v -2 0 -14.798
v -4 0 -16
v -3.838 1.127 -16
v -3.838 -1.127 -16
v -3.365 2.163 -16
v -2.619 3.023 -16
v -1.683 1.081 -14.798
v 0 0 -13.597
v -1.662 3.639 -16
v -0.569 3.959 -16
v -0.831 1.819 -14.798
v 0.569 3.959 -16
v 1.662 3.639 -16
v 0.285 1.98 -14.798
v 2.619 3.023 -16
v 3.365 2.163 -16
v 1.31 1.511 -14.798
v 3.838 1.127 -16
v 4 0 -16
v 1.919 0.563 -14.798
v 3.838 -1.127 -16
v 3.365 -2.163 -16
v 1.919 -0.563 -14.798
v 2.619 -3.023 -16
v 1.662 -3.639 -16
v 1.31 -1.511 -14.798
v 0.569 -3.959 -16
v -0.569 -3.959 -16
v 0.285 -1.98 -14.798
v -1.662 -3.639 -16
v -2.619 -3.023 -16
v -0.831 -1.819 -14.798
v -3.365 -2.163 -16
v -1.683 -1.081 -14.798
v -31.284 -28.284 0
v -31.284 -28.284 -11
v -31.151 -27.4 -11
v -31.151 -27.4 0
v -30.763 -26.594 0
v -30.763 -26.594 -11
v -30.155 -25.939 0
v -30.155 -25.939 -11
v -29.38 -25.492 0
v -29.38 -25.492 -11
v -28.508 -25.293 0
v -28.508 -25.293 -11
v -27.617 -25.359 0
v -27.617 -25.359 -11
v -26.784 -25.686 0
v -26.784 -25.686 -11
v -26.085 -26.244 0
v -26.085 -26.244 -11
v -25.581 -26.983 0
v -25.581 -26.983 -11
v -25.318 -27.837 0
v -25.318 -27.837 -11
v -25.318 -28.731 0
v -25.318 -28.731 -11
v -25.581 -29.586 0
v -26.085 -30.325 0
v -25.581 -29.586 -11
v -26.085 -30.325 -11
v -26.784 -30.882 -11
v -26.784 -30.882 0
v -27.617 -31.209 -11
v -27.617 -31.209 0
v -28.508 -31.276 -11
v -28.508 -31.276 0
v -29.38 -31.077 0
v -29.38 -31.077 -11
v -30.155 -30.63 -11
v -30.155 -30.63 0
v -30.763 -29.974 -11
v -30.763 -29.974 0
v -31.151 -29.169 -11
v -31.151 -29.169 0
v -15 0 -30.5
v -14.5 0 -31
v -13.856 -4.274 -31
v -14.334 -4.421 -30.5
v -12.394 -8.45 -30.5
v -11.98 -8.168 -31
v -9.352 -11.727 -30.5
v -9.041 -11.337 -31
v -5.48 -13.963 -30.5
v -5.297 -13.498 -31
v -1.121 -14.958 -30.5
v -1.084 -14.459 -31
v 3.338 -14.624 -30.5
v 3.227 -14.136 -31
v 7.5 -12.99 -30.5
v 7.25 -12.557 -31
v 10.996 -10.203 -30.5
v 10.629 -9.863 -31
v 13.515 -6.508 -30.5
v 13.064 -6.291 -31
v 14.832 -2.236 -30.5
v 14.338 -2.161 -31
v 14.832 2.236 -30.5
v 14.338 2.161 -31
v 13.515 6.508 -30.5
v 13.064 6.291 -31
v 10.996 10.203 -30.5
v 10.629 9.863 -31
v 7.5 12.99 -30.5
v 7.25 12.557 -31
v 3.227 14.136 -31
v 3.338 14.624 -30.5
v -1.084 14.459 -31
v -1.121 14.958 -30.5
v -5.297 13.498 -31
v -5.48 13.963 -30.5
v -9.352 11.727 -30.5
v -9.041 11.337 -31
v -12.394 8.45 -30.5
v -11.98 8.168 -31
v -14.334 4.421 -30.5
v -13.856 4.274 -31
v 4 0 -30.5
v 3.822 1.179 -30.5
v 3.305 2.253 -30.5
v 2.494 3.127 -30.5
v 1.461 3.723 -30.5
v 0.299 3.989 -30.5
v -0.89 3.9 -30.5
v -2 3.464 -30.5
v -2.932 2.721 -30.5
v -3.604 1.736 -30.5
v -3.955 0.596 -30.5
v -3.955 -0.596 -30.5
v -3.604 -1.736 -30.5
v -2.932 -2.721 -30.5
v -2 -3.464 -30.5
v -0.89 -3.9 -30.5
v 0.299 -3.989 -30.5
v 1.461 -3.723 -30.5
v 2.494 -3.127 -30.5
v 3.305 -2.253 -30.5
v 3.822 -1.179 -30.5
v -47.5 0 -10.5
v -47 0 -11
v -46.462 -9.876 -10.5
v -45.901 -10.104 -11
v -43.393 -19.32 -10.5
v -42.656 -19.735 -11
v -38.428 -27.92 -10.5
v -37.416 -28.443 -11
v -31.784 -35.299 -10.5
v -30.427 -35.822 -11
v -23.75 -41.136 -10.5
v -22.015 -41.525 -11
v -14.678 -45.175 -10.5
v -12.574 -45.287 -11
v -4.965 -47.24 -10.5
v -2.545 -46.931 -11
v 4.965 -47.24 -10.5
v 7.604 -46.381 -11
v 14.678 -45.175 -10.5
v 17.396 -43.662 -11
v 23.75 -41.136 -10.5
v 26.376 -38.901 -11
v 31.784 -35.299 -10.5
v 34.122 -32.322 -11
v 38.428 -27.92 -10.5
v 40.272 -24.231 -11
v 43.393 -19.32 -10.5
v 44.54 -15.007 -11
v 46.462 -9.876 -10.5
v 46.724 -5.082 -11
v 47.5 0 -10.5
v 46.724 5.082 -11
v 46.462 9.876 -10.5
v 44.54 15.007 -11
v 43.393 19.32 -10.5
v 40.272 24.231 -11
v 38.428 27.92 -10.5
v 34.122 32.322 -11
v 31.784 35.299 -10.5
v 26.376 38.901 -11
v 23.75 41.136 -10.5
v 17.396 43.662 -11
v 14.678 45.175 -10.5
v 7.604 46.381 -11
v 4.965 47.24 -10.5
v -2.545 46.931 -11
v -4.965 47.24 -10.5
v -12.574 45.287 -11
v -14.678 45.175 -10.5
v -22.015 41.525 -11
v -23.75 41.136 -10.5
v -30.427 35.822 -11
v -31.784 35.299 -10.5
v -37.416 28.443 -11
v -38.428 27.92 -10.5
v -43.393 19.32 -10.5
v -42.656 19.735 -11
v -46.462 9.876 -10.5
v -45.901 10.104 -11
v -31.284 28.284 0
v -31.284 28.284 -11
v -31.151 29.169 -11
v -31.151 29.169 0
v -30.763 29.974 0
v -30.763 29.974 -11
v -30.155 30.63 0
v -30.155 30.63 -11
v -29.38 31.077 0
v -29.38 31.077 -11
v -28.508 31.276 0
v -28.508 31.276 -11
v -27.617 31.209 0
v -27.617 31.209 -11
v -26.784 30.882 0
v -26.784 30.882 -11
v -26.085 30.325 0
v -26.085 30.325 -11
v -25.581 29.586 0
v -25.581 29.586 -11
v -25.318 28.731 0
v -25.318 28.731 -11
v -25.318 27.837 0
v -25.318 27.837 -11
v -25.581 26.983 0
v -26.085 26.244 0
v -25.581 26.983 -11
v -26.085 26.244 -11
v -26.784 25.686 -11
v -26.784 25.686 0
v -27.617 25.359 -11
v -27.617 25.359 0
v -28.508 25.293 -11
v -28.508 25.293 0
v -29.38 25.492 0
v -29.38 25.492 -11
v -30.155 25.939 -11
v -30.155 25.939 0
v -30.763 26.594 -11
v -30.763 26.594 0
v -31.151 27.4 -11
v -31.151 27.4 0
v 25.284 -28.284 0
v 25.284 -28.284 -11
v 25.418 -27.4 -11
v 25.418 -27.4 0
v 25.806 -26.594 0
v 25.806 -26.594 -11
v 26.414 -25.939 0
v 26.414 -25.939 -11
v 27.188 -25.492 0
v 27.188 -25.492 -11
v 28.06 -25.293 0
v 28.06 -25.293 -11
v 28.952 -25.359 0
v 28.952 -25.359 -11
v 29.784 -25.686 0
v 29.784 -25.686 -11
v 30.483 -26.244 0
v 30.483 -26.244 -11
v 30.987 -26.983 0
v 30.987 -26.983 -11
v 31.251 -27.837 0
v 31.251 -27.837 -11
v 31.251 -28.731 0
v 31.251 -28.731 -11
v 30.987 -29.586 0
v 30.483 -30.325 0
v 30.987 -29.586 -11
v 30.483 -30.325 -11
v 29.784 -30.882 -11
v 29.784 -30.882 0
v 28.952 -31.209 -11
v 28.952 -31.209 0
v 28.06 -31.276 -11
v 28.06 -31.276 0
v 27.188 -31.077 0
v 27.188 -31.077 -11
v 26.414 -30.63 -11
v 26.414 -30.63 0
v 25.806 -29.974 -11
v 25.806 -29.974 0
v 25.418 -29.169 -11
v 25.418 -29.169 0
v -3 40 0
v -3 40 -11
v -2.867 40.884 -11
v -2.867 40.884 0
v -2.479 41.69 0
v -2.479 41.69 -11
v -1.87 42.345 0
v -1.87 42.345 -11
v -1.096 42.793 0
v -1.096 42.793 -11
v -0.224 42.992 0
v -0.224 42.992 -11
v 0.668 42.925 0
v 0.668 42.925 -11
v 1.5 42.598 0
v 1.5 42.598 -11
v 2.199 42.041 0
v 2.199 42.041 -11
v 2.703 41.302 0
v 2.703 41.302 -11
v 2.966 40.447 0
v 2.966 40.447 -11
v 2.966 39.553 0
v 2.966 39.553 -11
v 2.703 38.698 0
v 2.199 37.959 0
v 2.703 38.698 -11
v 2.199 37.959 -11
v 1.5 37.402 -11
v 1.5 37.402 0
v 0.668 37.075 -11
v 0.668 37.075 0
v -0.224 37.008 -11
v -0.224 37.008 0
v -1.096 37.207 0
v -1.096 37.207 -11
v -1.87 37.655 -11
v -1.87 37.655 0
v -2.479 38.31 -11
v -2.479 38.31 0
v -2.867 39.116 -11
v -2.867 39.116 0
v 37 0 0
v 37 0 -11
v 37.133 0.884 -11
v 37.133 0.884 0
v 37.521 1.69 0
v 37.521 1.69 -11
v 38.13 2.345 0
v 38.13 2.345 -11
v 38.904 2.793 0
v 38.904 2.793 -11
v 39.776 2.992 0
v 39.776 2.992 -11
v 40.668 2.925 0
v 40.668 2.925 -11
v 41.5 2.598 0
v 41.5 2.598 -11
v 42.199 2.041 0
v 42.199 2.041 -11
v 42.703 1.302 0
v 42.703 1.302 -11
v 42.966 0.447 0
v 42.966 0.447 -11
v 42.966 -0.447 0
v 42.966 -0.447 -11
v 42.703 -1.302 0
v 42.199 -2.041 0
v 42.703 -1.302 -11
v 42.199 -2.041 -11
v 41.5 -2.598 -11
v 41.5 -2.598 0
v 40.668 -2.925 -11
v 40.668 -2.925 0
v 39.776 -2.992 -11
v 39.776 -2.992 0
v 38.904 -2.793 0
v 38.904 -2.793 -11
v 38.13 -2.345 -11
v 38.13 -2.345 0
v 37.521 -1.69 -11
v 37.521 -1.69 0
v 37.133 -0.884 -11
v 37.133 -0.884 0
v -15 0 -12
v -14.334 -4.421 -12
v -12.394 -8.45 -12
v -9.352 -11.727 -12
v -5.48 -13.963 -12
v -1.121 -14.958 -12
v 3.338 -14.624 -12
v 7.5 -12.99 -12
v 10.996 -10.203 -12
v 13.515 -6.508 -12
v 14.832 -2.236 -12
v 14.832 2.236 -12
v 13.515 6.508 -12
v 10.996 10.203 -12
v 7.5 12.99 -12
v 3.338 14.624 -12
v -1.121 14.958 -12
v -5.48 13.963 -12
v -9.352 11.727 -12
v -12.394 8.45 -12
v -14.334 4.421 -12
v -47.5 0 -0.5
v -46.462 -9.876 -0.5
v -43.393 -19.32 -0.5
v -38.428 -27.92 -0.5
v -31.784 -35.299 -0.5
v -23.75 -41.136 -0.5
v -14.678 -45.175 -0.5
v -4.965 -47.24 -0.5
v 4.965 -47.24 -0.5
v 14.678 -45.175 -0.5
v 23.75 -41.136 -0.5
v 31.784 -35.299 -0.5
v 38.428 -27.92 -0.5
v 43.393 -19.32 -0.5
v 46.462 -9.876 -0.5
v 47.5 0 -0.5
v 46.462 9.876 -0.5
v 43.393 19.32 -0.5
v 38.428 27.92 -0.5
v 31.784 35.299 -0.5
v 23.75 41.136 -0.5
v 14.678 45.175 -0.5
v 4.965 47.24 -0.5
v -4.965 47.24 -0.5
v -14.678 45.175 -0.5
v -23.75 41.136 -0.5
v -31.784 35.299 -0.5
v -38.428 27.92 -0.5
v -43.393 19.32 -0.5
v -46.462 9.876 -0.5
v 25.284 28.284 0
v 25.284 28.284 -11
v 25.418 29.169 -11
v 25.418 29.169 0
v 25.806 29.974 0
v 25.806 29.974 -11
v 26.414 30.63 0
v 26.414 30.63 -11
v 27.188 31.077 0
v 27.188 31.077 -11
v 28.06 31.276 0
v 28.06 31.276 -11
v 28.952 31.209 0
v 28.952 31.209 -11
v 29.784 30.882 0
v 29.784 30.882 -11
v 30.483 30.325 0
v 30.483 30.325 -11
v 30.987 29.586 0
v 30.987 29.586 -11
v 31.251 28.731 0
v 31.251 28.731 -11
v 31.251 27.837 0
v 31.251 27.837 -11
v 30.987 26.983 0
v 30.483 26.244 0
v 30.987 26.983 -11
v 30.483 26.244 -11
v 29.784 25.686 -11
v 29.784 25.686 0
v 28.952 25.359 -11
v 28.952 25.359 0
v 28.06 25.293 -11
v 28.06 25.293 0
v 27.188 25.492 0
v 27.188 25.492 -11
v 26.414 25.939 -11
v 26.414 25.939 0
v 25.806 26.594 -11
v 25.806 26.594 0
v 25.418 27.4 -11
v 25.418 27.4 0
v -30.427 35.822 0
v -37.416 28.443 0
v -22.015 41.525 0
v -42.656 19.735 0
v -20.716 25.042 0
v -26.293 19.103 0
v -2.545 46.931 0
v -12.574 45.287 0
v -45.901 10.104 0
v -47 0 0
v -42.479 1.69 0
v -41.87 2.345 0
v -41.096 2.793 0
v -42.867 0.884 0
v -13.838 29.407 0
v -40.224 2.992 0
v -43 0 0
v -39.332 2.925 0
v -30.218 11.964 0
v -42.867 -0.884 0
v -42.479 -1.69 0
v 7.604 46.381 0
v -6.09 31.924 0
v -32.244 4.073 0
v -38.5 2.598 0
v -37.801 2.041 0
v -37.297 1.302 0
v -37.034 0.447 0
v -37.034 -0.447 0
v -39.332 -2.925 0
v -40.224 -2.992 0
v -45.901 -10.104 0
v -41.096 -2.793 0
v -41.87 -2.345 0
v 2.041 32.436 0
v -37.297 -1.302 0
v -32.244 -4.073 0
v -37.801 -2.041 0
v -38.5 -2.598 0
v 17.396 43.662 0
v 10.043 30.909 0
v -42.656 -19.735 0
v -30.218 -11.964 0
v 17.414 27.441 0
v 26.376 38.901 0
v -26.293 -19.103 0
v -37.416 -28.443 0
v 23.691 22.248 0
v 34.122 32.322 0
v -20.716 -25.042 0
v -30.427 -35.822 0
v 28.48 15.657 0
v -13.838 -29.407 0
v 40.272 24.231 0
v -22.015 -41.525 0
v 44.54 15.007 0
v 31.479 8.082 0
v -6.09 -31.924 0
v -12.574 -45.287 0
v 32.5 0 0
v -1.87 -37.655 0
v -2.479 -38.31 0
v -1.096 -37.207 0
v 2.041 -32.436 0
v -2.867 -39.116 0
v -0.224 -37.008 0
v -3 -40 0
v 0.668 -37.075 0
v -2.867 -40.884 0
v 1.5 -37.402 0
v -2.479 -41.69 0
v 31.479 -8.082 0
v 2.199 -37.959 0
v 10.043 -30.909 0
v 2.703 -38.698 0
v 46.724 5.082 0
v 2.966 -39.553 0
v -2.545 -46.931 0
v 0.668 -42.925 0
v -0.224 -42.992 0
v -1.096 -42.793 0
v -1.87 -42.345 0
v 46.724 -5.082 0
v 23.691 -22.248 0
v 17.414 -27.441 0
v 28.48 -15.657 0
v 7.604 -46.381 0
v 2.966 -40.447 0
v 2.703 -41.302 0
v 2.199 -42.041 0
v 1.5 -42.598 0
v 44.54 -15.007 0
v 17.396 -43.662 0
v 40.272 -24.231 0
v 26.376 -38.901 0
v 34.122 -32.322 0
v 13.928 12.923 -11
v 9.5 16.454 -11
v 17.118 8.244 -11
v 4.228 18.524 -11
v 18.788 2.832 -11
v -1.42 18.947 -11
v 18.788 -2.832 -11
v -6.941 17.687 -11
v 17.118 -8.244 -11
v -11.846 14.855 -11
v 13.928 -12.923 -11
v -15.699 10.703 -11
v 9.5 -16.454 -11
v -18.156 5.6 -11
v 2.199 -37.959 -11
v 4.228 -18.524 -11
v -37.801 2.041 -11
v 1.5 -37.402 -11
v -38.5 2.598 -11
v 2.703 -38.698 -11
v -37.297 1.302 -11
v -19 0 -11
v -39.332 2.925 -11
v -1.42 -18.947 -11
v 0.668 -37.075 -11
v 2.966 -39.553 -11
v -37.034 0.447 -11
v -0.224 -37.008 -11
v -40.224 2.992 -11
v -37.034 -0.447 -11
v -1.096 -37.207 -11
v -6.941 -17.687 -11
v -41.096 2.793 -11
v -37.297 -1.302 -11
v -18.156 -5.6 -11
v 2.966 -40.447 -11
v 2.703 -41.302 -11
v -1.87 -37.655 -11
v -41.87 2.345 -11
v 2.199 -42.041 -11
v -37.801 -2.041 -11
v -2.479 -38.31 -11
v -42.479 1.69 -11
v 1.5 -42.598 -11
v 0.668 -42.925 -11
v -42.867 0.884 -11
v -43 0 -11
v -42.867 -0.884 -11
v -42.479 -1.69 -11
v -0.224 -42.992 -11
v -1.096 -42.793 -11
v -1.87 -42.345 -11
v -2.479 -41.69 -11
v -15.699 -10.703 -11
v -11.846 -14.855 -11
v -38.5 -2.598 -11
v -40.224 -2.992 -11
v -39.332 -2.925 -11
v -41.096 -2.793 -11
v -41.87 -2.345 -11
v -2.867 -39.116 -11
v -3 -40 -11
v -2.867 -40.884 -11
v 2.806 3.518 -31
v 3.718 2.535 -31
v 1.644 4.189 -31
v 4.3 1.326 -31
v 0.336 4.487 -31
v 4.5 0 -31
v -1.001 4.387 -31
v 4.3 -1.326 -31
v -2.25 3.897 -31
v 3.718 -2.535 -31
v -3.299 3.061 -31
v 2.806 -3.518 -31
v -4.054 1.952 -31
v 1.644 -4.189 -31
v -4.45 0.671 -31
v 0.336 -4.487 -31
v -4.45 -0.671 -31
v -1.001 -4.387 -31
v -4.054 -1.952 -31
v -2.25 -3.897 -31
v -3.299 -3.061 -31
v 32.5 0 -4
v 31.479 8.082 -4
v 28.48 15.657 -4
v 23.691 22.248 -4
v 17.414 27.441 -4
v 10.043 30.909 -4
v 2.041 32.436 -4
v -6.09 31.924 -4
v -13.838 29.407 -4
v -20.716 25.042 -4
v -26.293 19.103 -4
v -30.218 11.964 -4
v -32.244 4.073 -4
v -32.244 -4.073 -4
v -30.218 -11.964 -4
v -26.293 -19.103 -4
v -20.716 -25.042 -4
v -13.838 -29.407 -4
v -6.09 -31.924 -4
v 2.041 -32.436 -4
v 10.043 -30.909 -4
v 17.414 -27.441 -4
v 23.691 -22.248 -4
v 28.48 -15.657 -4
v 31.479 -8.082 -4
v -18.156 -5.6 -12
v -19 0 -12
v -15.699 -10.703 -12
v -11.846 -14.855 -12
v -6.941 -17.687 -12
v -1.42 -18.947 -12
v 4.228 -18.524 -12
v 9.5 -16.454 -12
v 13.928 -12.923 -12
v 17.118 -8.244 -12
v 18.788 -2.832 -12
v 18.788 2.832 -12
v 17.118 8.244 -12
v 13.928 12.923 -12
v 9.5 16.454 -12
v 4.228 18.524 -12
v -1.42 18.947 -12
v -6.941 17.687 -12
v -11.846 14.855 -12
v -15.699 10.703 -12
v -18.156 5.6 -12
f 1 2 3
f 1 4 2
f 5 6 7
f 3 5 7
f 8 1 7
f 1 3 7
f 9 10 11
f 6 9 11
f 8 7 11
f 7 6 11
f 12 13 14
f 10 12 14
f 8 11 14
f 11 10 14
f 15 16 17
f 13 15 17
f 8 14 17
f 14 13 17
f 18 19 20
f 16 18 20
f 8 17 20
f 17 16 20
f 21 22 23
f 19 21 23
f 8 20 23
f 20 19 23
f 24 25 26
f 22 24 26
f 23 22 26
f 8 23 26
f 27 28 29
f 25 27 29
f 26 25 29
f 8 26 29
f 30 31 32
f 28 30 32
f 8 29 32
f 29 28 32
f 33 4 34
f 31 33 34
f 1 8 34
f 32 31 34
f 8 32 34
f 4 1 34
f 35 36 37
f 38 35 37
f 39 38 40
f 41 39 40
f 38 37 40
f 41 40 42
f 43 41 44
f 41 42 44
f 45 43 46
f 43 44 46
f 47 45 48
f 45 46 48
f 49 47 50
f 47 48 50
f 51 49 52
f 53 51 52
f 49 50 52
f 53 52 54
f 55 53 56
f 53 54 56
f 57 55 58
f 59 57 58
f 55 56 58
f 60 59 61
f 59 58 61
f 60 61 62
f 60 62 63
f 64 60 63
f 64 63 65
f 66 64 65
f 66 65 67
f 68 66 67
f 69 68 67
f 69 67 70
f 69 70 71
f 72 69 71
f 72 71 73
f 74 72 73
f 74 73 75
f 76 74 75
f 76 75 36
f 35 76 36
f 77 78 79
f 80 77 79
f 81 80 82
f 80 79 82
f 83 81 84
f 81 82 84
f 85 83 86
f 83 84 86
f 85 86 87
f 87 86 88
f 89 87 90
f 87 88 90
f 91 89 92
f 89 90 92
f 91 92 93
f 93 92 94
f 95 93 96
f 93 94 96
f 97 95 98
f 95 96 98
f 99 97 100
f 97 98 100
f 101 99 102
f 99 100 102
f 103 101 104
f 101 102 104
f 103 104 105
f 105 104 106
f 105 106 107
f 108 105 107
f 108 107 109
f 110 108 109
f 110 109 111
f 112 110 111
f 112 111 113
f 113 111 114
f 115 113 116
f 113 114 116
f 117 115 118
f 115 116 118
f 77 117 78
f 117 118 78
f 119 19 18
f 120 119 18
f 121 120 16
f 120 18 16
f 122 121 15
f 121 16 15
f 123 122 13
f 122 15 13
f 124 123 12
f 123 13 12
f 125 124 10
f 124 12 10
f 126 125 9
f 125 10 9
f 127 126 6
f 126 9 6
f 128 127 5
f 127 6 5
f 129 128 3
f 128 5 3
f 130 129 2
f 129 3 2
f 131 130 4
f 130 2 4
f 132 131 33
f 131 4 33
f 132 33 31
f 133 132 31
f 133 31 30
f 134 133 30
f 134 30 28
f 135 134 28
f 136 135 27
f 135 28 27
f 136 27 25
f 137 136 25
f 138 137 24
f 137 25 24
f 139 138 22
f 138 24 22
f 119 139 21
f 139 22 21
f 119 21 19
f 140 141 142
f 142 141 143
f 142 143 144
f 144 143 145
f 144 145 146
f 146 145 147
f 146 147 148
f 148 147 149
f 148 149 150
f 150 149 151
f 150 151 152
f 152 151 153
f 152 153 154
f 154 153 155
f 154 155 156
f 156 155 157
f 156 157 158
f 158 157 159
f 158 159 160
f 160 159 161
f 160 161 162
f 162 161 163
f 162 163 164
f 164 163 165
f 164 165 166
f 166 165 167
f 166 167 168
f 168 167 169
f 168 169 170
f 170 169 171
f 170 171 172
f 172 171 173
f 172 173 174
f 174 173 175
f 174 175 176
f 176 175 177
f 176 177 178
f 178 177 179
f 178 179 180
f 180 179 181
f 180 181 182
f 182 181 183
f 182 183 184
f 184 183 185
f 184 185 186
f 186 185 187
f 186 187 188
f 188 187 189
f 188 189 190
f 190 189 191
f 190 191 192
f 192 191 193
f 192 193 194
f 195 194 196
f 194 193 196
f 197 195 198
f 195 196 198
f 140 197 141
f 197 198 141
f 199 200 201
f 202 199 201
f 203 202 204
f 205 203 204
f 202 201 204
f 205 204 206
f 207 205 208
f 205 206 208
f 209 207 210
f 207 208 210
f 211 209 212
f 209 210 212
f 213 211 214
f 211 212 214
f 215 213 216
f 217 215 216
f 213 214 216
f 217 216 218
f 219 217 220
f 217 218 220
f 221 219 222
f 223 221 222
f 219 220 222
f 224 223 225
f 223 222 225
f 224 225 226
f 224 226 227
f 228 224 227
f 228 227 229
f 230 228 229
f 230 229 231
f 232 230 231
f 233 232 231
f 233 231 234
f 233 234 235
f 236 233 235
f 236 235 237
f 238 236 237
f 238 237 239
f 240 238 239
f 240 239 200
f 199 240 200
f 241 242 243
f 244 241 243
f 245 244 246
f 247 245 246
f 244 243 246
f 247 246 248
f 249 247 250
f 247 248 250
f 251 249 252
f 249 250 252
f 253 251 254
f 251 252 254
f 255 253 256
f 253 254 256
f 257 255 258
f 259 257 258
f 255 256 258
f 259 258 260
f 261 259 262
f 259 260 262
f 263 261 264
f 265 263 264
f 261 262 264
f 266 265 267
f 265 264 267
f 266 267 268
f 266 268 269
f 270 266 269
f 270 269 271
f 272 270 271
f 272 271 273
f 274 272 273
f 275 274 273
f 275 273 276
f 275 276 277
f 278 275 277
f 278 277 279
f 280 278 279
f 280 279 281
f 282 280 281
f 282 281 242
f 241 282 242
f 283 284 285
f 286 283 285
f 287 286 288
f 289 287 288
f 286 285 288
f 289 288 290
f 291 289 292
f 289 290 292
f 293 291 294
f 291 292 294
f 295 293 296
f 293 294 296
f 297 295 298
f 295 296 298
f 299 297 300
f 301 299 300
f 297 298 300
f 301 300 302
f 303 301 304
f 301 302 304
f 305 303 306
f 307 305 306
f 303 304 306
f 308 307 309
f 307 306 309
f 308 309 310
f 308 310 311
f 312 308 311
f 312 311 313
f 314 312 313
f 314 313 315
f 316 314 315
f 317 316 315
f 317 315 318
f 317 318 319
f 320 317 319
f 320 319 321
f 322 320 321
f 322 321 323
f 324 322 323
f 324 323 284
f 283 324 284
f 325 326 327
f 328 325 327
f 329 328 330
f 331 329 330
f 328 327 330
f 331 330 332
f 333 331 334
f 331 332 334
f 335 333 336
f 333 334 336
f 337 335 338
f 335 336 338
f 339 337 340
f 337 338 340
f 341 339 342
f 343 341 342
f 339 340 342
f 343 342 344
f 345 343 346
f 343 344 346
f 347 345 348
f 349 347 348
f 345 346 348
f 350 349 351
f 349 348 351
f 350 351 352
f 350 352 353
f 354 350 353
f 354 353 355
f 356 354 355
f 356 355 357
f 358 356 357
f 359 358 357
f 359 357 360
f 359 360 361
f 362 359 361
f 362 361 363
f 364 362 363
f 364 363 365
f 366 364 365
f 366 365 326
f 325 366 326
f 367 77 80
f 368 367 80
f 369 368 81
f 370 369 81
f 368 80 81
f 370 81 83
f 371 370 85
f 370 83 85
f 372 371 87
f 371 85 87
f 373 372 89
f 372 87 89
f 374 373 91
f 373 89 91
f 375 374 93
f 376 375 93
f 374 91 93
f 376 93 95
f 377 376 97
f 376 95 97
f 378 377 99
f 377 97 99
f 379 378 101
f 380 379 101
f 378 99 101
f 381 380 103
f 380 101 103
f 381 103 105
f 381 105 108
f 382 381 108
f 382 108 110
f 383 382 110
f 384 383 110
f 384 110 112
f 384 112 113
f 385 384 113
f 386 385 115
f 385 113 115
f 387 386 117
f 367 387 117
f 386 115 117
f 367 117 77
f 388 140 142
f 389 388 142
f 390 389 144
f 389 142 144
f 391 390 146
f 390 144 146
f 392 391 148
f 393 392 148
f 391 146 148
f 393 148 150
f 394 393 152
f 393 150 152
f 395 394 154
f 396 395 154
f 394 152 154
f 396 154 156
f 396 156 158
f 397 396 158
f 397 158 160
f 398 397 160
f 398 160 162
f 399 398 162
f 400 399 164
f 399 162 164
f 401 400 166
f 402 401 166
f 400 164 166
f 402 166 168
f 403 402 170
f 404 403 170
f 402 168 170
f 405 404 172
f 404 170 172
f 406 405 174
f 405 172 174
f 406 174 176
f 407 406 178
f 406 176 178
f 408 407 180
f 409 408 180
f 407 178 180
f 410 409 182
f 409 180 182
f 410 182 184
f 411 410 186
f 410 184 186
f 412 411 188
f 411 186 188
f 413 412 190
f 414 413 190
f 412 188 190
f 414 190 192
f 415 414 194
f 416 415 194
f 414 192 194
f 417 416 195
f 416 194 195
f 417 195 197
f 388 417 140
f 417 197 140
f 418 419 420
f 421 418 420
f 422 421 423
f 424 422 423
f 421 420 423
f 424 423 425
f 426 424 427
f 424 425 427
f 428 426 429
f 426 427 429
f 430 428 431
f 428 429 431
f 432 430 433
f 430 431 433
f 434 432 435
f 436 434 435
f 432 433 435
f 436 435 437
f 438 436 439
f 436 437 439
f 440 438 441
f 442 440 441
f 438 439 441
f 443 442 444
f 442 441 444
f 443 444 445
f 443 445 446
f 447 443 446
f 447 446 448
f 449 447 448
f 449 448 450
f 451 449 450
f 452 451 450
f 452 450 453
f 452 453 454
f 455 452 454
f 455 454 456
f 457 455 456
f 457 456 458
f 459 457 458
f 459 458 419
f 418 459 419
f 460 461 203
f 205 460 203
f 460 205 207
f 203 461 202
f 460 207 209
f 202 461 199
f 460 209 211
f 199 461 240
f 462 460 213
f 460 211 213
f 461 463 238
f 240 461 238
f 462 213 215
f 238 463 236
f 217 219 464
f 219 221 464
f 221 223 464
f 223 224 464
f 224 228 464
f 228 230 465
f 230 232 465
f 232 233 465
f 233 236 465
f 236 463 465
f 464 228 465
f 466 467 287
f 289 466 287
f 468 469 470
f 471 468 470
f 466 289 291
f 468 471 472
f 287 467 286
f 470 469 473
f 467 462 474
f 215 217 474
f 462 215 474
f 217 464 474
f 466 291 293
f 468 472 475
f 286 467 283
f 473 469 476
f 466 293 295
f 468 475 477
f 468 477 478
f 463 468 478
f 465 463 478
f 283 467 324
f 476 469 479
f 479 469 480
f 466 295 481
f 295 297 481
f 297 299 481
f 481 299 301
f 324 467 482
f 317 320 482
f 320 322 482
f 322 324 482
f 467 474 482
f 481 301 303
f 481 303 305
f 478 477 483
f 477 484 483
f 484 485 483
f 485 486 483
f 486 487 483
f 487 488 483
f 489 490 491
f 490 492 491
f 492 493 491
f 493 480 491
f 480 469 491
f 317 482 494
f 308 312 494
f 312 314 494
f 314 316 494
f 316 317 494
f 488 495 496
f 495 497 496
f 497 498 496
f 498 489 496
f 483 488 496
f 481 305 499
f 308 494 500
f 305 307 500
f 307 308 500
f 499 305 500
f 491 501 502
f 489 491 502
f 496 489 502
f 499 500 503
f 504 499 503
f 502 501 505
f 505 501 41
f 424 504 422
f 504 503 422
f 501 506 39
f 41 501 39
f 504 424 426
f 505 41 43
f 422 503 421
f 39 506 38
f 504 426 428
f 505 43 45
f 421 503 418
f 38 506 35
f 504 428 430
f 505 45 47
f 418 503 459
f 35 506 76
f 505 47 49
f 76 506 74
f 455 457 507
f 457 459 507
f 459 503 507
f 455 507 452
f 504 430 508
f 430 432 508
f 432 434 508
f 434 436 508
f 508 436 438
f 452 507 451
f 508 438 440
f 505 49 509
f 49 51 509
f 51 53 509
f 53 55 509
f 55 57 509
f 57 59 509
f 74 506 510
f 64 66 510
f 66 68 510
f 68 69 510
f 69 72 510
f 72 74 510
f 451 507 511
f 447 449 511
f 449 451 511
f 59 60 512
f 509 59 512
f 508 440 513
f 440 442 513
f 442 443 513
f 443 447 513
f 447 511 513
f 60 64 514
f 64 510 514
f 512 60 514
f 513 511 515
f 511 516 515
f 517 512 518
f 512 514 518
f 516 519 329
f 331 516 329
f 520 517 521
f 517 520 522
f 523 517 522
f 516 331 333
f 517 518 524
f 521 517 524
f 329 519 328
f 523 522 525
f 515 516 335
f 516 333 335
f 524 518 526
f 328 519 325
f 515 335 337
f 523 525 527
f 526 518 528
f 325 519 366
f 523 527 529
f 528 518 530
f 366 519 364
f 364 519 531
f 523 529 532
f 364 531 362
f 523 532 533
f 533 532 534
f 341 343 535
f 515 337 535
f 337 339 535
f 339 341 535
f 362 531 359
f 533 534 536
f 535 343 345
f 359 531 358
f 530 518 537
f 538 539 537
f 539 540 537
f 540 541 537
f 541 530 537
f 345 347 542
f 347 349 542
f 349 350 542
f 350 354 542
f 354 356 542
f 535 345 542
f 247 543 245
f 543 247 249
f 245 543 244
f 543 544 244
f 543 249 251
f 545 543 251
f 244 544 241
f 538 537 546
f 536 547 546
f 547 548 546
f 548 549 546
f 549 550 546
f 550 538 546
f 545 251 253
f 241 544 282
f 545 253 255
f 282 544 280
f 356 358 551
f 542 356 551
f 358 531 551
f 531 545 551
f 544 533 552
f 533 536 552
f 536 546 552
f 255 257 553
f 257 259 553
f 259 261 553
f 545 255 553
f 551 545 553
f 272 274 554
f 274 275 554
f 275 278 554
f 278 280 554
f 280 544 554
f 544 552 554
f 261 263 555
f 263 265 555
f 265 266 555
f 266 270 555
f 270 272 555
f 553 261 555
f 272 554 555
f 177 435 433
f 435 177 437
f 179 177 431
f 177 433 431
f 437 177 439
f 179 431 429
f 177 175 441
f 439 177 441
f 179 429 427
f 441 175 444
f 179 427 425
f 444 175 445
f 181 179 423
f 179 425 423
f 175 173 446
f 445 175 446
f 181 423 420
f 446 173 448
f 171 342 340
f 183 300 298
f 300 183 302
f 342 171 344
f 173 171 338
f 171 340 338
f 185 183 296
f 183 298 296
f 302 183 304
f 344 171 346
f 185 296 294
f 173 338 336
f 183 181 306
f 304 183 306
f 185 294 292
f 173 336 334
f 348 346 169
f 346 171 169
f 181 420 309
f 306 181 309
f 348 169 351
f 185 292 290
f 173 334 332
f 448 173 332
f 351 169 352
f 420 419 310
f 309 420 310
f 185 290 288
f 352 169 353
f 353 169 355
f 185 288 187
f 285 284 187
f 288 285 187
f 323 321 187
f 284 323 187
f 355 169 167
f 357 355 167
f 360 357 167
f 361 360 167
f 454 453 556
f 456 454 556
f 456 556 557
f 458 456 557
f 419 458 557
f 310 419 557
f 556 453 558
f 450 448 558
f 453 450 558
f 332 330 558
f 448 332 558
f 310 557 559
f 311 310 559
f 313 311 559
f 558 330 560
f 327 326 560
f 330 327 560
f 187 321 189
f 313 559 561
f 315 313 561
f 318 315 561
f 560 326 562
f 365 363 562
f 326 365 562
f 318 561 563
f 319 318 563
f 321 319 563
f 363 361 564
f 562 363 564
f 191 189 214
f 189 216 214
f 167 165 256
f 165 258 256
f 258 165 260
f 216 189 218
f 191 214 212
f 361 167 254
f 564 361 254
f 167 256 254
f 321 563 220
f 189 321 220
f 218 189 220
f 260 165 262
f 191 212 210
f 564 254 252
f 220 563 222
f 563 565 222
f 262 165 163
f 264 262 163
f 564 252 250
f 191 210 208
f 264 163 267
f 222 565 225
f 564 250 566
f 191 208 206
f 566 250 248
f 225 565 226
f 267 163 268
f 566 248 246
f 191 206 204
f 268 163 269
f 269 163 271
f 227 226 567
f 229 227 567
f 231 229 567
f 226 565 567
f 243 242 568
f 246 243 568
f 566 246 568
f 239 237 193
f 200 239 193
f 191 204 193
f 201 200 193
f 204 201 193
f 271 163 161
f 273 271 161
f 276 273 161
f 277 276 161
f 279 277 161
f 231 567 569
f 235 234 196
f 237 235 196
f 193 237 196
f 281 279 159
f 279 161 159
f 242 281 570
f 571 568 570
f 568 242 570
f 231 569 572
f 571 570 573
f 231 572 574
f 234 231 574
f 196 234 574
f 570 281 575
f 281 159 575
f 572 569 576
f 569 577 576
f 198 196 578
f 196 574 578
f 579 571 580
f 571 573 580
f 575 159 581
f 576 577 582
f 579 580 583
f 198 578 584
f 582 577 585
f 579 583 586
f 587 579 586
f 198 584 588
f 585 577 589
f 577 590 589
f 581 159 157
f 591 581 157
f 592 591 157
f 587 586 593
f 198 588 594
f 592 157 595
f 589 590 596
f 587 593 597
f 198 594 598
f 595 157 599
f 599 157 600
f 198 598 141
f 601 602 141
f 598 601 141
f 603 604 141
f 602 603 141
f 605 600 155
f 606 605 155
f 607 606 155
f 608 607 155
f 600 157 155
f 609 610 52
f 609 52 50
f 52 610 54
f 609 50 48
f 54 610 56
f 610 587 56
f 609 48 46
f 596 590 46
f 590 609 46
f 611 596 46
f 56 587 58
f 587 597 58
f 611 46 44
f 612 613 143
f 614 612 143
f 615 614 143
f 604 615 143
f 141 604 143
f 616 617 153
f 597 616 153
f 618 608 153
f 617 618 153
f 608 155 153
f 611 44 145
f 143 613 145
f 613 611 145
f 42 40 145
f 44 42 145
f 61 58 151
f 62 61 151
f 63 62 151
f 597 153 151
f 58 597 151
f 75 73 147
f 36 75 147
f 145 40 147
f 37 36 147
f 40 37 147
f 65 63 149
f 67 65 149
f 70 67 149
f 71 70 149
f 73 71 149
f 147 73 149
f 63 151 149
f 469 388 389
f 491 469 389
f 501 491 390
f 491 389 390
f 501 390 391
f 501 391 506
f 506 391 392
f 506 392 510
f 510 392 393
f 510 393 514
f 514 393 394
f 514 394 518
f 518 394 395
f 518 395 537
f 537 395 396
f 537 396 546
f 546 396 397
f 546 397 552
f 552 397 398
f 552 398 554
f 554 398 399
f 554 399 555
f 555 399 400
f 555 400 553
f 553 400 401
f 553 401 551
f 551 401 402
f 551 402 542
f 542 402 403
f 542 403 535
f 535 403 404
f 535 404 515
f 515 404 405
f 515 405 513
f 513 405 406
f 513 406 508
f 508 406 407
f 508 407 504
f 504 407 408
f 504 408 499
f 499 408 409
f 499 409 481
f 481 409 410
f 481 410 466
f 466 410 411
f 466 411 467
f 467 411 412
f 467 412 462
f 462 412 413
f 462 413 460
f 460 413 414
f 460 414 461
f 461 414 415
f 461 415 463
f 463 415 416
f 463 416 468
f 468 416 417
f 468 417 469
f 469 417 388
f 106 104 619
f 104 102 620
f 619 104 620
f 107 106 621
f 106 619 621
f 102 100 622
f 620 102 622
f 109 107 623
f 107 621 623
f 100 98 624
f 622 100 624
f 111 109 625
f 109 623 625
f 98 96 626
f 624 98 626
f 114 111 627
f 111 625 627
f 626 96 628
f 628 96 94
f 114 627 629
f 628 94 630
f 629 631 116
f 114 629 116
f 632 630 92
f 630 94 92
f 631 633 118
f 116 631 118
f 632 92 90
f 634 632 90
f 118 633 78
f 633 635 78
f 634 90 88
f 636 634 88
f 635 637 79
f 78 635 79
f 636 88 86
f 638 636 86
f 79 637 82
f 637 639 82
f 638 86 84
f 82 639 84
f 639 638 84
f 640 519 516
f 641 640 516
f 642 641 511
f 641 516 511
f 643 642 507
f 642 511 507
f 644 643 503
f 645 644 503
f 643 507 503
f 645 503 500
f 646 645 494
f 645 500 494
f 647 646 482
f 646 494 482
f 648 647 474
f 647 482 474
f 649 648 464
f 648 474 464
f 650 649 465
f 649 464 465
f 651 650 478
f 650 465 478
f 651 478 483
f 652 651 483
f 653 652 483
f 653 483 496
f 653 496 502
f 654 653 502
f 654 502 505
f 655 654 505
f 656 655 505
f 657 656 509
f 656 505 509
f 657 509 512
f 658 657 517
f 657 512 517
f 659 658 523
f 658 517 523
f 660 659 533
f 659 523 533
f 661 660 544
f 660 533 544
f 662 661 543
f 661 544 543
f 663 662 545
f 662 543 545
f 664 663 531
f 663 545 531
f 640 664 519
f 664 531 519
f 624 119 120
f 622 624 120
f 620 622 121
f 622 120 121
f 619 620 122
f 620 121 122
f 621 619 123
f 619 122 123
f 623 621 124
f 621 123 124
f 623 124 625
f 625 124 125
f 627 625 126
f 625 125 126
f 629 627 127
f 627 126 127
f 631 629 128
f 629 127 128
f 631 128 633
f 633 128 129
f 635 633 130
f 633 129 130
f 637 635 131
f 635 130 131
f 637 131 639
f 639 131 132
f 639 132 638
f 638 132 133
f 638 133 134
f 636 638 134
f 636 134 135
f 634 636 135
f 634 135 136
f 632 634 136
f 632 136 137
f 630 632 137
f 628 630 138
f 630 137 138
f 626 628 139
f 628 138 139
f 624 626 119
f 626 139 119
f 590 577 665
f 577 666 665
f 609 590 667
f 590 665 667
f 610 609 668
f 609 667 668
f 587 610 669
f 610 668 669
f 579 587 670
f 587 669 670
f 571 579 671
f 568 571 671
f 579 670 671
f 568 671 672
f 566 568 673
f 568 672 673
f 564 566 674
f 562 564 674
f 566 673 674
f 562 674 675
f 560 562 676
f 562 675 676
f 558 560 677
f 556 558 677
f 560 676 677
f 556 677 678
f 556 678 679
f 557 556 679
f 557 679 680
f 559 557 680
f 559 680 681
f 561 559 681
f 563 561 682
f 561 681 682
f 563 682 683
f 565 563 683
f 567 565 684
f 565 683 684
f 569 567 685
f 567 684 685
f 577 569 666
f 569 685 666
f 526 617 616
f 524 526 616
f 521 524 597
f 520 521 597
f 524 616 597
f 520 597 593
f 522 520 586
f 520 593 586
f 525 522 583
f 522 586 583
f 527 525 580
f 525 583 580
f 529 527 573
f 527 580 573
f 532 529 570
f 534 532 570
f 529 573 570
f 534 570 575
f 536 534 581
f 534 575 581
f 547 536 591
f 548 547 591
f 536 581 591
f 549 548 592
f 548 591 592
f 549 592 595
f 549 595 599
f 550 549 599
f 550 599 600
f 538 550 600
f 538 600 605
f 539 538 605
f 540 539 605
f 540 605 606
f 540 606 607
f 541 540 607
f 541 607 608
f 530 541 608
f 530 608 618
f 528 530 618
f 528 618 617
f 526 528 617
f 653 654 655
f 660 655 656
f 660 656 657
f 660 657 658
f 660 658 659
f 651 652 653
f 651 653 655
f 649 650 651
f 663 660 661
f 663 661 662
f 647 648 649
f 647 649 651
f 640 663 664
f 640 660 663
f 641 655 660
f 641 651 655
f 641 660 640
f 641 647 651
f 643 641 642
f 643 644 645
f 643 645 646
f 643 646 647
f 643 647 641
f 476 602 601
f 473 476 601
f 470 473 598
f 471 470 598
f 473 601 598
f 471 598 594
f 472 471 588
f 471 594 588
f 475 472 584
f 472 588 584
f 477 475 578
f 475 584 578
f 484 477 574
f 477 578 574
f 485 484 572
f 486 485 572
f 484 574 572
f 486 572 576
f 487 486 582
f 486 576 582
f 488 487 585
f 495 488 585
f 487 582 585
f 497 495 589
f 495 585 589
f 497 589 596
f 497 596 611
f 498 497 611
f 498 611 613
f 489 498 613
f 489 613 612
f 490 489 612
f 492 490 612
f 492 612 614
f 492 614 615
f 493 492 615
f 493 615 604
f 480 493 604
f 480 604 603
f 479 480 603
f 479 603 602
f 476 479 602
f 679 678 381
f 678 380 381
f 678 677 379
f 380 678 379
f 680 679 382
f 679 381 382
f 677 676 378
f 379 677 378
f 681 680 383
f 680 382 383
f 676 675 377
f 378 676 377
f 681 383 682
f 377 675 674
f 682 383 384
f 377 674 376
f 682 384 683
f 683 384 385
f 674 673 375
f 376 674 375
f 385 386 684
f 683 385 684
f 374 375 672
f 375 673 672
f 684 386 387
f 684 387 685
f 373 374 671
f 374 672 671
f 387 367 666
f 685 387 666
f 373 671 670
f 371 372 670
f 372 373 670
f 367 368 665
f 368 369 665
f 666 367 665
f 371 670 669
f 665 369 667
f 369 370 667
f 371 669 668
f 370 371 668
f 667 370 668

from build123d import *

# Parameters (mm, degrees)
SKETCH_3_R          = 32.5
CUT_EXTRUDE_1_DEPTH = 4
MM_1_D              = 8
MM_1_DEPTH          = 15
MM_1_TIP            = 2.403442476
CUT_EXTRUDE_2_REACH = 72.089
SKETCH_6_R          = 3
CHAMFER_1_SIZE      = 0.5


with BuildPart() as part:
    # 草图1 → 旋转1 (revolve)
    with BuildSketch(Plane(origin=(0, 0, 0), x_dir=(0, 0, -1), z_dir=(1, 0, 0)), mode=Mode.PRIVATE) as revolve_1_sk:
        Polygon((0, 0), (0, 47.5), (11, 47.5), (11, 19), (12, 19), (12, 15), (31, 15), (31, 0), align=None)
    revolve(revolve_1_sk.sketch.rotate(Axis((0, 0, 0), (0, 0, 1)), 90), axis=Axis((0, 0, 0), (0, 0, 1)))

    # 草图3 → 切除-拉伸1 (cut)
    with BuildSketch(Plane.XY):
        Circle(SKETCH_3_R)
    extrude(amount=-CUT_EXTRUDE_1_DEPTH, mode=Mode.SUBTRACT)

    # 大小mm 暗销孔1
    with Locations(Plane(origin=(0, 0, -31), x_dir=(-1, 0, 0), z_dir=(0, 0, -1))):
        with Locations((0, 0)):
            Hole(MM_1_D / 2, depth=MM_1_DEPTH)
            with Locations((0, 0, -(MM_1_DEPTH + MM_1_TIP / 2))):  # 118° drill point
                Cone(0, MM_1_D / 2, MM_1_TIP, mode=Mode.SUBTRACT)

    # 草图6 → 切除-拉伸2 (cut, up to next)
    with BuildSketch(Plane(origin=(0, 0, -11), x_dir=(-1, 0, 0), z_dir=(0, 0, -1)), mode=Mode.PRIVATE) as cut_extrude_2_sk1:
        with Locations((0, 40)):
            Circle(SKETCH_6_R)
    cut_extrude_2_tool1 = extrude(cut_extrude_2_sk1.sketch, amount=-CUT_EXTRUDE_2_REACH, mode=Mode.PRIVATE) & part.part
    # 草图6 → 切除-拉伸2 (cut, up to next)
    with BuildSketch(Plane(origin=(0, 0, -11), x_dir=(-1, 0, 0), z_dir=(0, 0, -1)), mode=Mode.PRIVATE) as cut_extrude_2_sk2:
        with Locations((28.284271247, 28.284271247)):
            Circle(SKETCH_6_R)
    cut_extrude_2_tool2 = extrude(cut_extrude_2_sk2.sketch, amount=-CUT_EXTRUDE_2_REACH, mode=Mode.PRIVATE) & part.part
    # 草图6 → 切除-拉伸2 (cut, up to next)
    with BuildSketch(Plane(origin=(0, 0, -11), x_dir=(-1, 0, 0), z_dir=(0, 0, -1)), mode=Mode.PRIVATE) as cut_extrude_2_sk3:
        with Locations((40, 0)):
            Circle(SKETCH_6_R)
    cut_extrude_2_tool3 = extrude(cut_extrude_2_sk3.sketch, amount=-CUT_EXTRUDE_2_REACH, mode=Mode.PRIVATE) & part.part
    # 草图6 → 切除-拉伸2 (cut, up to next)
    with BuildSketch(Plane(origin=(0, 0, -11), x_dir=(-1, 0, 0), z_dir=(0, 0, -1)), mode=Mode.PRIVATE) as cut_extrude_2_sk4:
        with Locations((28.284271247, -28.284271247)):
            Circle(SKETCH_6_R)
    cut_extrude_2_tool4 = extrude(cut_extrude_2_sk4.sketch, amount=-CUT_EXTRUDE_2_REACH, mode=Mode.PRIVATE) & part.part
    # 草图6 → 切除-拉伸2 (cut, up to next)
    with BuildSketch(Plane(origin=(0, 0, -11), x_dir=(-1, 0, 0), z_dir=(0, 0, -1)), mode=Mode.PRIVATE) as cut_extrude_2_sk5:
        with Locations((0, -40)):
            Circle(SKETCH_6_R)
    cut_extrude_2_tool5 = extrude(cut_extrude_2_sk5.sketch, amount=-CUT_EXTRUDE_2_REACH, mode=Mode.PRIVATE) & part.part
    # 草图6 → 切除-拉伸2 (cut, up to next)
    with BuildSketch(Plane(origin=(0, 0, -11), x_dir=(-1, 0, 0), z_dir=(0, 0, -1)), mode=Mode.PRIVATE) as cut_extrude_2_sk6:
        with Locations((-28.284271247, -28.284271247)):
            Circle(SKETCH_6_R)
    cut_extrude_2_tool6 = extrude(cut_extrude_2_sk6.sketch, amount=-CUT_EXTRUDE_2_REACH, mode=Mode.PRIVATE) & part.part
    # 草图6 → 切除-拉伸2 (cut, up to next)
    with BuildSketch(Plane(origin=(0, 0, -11), x_dir=(-1, 0, 0), z_dir=(0, 0, -1)), mode=Mode.PRIVATE) as cut_extrude_2_sk7:
        with Locations((-40, 0)):
            Circle(SKETCH_6_R)
    cut_extrude_2_tool7 = extrude(cut_extrude_2_sk7.sketch, amount=-CUT_EXTRUDE_2_REACH, mode=Mode.PRIVATE) & part.part
    # 草图6 → 切除-拉伸2 (cut, up to next)
    with BuildSketch(Plane(origin=(0, 0, -11), x_dir=(-1, 0, 0), z_dir=(0, 0, -1)), mode=Mode.PRIVATE) as cut_extrude_2_sk8:
        with Locations((-28.284271247, 28.284271247)):
            Circle(SKETCH_6_R)
    cut_extrude_2_tool8 = extrude(cut_extrude_2_sk8.sketch, amount=-CUT_EXTRUDE_2_REACH, mode=Mode.PRIVATE) & part.part
    add(cut_extrude_2_tool1.solids().sort_by_distance((0, 40, -11))[0], mode=Mode.SUBTRACT)
    add(cut_extrude_2_tool2.solids().sort_by_distance((-28.284271, 28.284271, -11))[0], mode=Mode.SUBTRACT)
    add(cut_extrude_2_tool3.solids().sort_by_distance((-40, 0, -11))[0], mode=Mode.SUBTRACT)
    add(cut_extrude_2_tool4.solids().sort_by_distance((-28.284271, -28.284271, -11))[0], mode=Mode.SUBTRACT)
    add(cut_extrude_2_tool5.solids().sort_by_distance((0, -40, -11))[0], mode=Mode.SUBTRACT)
    add(cut_extrude_2_tool6.solids().sort_by_distance((28.284271, -28.284271, -11))[0], mode=Mode.SUBTRACT)
    add(cut_extrude_2_tool7.solids().sort_by_distance((40, 0, -11))[0], mode=Mode.SUBTRACT)
    add(cut_extrude_2_tool8.solids().sort_by_distance((28.284271, 28.284271, -11))[0], mode=Mode.SUBTRACT)

    # 倒角1
    chamfer_1_edges = [part.edges().sort_by_distance(p)[0] for p in [
        (-4, 0, -31),
        (15, 0, -31),
        (47.5, 0, -11),
        (47.5, 0, 0),
    ]]
    chamfer(chamfer_1_edges, length=CHAMFER_1_SIZE)


solid = part.part
